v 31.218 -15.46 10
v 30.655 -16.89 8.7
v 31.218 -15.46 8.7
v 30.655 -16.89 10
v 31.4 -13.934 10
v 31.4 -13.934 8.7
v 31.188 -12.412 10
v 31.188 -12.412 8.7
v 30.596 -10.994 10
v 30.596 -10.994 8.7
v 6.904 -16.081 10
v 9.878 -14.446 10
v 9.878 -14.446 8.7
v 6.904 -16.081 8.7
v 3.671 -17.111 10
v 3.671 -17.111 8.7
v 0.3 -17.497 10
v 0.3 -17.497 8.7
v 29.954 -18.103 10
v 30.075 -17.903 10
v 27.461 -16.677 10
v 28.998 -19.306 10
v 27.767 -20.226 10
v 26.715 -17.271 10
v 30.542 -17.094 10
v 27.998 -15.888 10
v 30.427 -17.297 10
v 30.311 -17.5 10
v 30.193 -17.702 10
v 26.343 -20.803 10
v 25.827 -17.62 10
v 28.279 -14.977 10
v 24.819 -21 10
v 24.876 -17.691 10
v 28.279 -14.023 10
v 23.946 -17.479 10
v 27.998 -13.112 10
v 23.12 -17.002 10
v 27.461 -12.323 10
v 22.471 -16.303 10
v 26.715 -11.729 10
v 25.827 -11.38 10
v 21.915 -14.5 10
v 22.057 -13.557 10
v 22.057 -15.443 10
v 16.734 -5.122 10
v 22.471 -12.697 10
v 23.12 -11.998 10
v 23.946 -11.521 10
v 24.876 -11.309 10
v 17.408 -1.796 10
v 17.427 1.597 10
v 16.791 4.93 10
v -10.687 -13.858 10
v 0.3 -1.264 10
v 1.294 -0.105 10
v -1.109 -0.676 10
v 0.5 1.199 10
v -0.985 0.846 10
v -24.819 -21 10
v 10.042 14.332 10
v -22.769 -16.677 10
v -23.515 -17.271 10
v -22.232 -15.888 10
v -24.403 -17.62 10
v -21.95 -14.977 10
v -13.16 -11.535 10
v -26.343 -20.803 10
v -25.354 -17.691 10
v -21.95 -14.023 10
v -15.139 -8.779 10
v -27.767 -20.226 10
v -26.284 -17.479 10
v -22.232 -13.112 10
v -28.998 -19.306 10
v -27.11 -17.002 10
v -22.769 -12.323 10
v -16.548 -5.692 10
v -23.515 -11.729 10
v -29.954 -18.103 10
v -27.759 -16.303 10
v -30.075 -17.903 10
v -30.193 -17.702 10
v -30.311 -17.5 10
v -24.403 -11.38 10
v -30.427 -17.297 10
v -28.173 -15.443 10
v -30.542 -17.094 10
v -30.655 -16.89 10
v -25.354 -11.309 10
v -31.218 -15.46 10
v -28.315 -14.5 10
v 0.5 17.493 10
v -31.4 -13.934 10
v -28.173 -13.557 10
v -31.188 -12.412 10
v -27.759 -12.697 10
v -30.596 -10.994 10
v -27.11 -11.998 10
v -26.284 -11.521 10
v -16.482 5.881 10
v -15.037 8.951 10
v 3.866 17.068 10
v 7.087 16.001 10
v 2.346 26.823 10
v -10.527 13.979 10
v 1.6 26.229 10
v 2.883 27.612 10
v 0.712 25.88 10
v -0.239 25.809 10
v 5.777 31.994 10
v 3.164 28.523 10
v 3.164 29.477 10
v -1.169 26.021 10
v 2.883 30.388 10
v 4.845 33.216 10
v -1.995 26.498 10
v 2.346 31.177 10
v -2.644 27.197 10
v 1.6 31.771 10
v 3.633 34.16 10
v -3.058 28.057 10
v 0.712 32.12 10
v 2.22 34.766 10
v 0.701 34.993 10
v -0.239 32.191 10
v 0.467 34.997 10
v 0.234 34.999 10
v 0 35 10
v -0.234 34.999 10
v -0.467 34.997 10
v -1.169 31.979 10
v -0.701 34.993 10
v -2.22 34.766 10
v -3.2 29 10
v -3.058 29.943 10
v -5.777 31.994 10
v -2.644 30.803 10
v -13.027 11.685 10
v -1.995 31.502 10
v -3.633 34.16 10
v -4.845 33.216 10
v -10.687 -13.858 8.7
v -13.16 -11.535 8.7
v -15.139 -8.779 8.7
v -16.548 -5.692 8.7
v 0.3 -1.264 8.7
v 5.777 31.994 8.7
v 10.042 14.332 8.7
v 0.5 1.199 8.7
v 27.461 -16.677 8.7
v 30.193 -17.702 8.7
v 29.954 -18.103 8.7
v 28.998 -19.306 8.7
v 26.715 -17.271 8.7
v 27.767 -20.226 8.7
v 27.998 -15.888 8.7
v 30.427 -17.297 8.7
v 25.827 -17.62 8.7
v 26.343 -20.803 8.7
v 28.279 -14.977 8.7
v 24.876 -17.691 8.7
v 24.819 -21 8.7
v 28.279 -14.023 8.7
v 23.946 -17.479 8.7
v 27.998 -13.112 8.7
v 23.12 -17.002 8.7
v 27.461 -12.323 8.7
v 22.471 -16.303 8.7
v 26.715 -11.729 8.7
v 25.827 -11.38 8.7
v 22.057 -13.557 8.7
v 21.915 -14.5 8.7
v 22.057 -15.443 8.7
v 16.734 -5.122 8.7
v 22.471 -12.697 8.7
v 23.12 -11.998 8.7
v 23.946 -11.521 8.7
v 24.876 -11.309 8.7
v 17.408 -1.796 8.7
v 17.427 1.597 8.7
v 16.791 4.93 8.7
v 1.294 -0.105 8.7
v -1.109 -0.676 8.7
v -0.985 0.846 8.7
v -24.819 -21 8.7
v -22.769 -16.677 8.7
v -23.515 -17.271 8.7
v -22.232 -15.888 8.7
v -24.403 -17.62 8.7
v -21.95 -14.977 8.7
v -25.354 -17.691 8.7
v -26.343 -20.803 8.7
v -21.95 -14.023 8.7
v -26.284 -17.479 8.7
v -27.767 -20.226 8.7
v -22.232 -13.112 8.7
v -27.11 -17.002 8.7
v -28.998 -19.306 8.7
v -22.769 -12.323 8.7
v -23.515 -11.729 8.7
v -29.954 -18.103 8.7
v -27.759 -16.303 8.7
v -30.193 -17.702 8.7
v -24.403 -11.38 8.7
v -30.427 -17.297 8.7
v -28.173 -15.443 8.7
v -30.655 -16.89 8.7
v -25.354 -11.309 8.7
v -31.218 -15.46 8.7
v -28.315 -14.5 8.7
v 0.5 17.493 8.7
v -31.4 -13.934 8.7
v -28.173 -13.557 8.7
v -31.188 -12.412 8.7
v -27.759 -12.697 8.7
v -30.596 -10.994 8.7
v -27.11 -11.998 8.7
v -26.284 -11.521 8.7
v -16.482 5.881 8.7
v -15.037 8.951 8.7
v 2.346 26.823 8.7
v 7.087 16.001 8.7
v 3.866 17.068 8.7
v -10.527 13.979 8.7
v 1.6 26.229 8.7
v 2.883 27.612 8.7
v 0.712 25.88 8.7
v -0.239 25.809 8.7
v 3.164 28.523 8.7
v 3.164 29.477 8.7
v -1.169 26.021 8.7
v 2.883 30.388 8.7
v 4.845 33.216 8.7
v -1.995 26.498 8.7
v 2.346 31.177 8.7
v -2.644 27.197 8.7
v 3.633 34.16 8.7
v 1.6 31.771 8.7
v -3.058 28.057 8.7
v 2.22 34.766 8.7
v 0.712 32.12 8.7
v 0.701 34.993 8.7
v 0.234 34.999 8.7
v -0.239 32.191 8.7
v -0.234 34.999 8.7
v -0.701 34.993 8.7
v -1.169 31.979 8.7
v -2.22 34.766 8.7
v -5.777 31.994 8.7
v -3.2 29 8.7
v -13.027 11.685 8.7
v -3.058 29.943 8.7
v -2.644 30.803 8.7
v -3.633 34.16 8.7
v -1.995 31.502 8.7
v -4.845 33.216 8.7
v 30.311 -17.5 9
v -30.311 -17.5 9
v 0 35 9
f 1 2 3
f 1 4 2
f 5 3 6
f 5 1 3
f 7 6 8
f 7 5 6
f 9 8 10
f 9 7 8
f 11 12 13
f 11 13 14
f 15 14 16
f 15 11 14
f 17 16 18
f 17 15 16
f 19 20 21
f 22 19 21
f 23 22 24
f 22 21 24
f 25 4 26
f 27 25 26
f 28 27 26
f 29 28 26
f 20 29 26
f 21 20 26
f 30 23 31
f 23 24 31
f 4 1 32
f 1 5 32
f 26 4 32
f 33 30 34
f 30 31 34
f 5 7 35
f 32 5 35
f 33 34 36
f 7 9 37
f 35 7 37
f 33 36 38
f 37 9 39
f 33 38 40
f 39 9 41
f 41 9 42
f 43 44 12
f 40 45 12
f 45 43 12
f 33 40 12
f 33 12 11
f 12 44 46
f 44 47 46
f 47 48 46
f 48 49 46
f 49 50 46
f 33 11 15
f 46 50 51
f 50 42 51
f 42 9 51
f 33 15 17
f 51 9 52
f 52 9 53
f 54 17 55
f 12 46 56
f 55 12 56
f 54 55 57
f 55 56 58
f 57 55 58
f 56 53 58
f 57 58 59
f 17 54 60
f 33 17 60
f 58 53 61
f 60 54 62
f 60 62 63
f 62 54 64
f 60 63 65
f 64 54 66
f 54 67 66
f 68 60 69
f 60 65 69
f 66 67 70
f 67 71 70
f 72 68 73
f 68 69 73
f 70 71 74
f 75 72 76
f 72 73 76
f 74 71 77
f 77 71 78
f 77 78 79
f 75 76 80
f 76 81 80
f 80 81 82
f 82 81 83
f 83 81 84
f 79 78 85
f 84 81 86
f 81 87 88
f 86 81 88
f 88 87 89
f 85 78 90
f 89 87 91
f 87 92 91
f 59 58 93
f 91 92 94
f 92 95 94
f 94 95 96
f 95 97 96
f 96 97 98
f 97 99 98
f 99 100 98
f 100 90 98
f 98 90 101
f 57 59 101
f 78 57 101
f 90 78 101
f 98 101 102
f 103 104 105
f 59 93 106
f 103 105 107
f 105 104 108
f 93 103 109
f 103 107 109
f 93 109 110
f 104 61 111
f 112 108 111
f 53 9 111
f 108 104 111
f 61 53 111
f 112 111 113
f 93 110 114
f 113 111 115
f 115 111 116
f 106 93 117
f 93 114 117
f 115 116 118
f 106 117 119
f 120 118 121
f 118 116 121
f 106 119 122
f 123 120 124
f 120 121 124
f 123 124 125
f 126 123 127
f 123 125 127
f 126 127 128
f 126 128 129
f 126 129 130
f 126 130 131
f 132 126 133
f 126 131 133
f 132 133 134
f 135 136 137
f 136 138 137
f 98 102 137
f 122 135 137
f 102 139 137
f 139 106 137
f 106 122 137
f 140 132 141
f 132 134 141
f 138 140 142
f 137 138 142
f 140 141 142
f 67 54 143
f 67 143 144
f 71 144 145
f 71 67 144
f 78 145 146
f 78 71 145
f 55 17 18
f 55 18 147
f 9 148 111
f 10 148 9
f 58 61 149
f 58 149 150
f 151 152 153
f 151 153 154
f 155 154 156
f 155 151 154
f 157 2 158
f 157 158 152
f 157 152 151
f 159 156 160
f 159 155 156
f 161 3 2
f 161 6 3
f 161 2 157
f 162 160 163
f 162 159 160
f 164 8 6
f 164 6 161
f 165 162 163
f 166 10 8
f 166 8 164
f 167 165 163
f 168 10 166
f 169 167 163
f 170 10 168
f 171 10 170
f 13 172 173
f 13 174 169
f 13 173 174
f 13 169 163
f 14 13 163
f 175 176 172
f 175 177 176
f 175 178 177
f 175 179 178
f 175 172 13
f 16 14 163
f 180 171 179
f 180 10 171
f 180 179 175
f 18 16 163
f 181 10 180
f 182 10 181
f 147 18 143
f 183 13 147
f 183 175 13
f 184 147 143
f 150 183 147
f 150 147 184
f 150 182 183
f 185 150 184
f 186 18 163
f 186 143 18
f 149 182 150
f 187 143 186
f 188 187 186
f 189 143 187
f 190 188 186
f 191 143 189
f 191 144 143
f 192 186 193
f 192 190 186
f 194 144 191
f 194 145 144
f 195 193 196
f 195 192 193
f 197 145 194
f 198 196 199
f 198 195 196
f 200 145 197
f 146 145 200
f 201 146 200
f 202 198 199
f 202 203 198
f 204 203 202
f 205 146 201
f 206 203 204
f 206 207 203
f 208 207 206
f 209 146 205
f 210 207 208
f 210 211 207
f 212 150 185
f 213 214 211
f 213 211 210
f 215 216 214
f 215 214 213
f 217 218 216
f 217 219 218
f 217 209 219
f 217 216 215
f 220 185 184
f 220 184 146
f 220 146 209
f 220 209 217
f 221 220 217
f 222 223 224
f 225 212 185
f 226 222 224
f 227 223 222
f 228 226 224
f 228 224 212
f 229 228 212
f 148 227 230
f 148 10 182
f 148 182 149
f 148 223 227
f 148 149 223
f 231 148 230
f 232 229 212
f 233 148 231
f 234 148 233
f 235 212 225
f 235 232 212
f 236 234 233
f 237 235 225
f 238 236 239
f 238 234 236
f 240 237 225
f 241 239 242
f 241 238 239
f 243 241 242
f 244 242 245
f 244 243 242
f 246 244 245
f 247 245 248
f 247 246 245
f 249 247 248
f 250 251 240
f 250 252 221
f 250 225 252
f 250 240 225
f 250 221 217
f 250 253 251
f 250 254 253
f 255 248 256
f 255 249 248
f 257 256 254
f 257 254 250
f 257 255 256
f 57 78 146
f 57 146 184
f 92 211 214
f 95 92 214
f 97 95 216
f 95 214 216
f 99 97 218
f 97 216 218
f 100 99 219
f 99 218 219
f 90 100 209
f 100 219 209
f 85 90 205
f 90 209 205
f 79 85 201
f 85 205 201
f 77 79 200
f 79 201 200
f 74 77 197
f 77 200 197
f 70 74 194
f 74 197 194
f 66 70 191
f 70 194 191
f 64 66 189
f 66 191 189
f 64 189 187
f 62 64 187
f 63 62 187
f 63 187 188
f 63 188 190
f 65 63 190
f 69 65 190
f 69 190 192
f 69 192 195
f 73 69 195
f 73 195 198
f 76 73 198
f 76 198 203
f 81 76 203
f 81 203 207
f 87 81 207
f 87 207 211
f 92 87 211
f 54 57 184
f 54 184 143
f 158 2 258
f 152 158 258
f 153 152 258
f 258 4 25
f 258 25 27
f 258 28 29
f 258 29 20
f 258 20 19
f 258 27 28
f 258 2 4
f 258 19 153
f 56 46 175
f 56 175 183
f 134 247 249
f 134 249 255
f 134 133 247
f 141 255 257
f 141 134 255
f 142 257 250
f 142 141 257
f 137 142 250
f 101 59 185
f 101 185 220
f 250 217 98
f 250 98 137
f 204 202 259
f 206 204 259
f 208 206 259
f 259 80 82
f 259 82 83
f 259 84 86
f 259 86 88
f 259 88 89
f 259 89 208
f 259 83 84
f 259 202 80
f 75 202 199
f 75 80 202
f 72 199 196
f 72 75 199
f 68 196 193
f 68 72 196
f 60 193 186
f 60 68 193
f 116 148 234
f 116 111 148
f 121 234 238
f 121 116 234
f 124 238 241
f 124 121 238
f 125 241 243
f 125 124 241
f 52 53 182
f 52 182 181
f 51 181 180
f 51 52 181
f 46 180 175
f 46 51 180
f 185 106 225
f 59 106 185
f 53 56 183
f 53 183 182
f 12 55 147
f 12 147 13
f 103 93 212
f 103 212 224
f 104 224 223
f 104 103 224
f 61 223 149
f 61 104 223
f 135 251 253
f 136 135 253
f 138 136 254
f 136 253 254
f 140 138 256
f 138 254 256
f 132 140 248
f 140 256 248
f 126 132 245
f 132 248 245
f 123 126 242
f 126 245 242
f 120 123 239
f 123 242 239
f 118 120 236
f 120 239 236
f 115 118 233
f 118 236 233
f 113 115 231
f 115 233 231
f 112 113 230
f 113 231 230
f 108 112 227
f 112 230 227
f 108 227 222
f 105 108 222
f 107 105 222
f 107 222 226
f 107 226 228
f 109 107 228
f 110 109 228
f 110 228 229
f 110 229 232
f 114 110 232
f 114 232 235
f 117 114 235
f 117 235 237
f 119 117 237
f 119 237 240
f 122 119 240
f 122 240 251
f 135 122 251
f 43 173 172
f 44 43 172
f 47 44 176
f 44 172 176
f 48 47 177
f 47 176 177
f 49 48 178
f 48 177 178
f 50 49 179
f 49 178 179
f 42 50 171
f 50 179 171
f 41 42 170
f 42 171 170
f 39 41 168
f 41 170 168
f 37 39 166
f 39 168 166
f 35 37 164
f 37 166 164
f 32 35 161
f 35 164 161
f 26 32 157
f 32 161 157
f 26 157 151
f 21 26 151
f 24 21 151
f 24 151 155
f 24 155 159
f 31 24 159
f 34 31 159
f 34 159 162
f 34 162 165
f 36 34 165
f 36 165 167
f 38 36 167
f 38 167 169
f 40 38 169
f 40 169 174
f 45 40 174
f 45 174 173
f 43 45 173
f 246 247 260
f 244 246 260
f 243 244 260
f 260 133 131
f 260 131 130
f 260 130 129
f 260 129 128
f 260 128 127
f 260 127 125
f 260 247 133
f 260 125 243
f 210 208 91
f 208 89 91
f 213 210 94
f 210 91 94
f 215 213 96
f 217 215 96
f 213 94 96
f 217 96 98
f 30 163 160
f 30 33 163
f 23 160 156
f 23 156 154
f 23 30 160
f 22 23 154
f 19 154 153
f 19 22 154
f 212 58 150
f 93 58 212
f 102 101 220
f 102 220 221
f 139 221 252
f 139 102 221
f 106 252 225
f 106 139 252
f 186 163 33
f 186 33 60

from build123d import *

# Parameters (mm, degrees)
SKETCH2_R           = 19
BOSS_EXTRUDE1_DEPTH = 1.3
BOSS_EXTRUDE7_START = -1.3
BOSS_EXTRUDE7_DEPTH = 1.3
SKETCH17_R          = 0.7
BOSS_EXTRUDE9_DEPTH = 1.3
BOSS_EXTRUDE2_START = -1.3
SKETCH3_R           = 35
SKETCH3_R_2         = 19
BOSS_EXTRUDE2_DEPTH = 1.3
SKETCH6_R           = 5
BOSS_EXTRUDE4_DEPTH = 1
SKETCH7_R           = 59.131365533
CUT_EXTRUDE1_DEPTH  = 10
FILLET1_R           = 6
SKETCH4_R           = 3.2
CUT_EXTRUDE2_DEPTH  = 10


with BuildPart() as part:
    # Sketch2 → Boss-Extrude1 (new body)
    with BuildSketch(Plane.XY.offset(10)):
        Circle(SKETCH2_R)
        with BuildLine():
            ThreePointArc((0, 0.943688479), (0.291615777, 0.897501077), (0.554686171, 0.763460017))
            Line((0.554686171, 0.763460017), (10.580134541, 14.562305899))
            ThreePointArc((10.580134541, 14.562305899), (14.562305899, 10.580134541), (17.119017293, 5.562305899))
            Line((17.119017293, 5.562305899), (0.897501077, 0.291615777))
            ThreePointArc((0.897501077, 0.291615777), (0.943688479, 0), (0.897501077, -0.291615777))
            Line((0.897501077, -0.291615777), (17.119017293, -5.562305899))
            ThreePointArc((17.119017293, -5.562305899), (14.562305899, -10.580134541), (10.580134541, -14.562305899))
            Line((10.580134541, -14.562305899), (0.554686171, -0.763460017))
            ThreePointArc((0.554686171, -0.763460017), (0.291615777, -0.897501077), (0, -0.943688479))
            Line((0, -0.943688479), (0, -18))
            ThreePointArc((0, -18), (-5.562305899, -17.119017293), (-10.580134541, -14.562305899))
            Line((-10.580134541, -14.562305899), (-0.554686171, -0.763460017))
            ThreePointArc((-0.554686171, -0.763460017), (-0.763460017, -0.554686171), (-0.897501077, -0.291615777))
            Line((-0.897501077, -0.291615777), (-17.119017293, -5.562305899))
            ThreePointArc((-17.119017293, -5.562305899), (-18, 0), (-17.119017293, 5.562305899))
            Line((-17.119017293, 5.562305899), (-0.897501077, 0.291615777))
            ThreePointArc((-0.897501077, 0.291615777), (-0.763460017, 0.554686171), (-0.554686171, 0.763460017))
            Line((-0.554686171, 0.763460017), (-10.580134541, 14.562305899))
            ThreePointArc((-10.580134541, 14.562305899), (-5.562305899, 17.119017293), (0, 18))
            Line((0, 18), (0, 0.943688479))
        make_face(mode=Mode.SUBTRACT)
        with BuildLine():
            Line((0.5, 1.198581445), (0.5, 17.492855685))
            ThreePointArc((0.5, 17.492855685), (5.50283957, 16.612307385), (10.042025258, 14.332052495))
            Line((10.042025258, 14.332052495), (0.5, 1.198581445))
        make_face(mode=Mode.SUBTRACT)
        with BuildLine():
            Line((-0.985410197, 0.845910294), (-16.48218589, 5.881117945))
            ThreePointArc((-16.48218589, 5.881117945), (-14.098772245, 10.366996729), (-10.527435455, 13.979381344))
            Line((-10.527435455, 13.979381344), (-0.985410197, 0.845910294))
        make_face(mode=Mode.SUBTRACT)
        with BuildLine():
            Line((-1.109016994, -0.675780132), (-10.686551089, -13.858124903))
            ThreePointArc((-10.686551089, -13.858124903), (-14.216360017, -10.205151045), (-16.548338183, -5.692319683))
            Line((-16.548338183, -5.692319683), (-1.109016994, -0.675780132))
        make_face(mode=Mode.SUBTRACT)
        with BuildLine():
            ThreePointArc((9.877534095, -14.445910155), (5.312578558, -16.674126936), (0.3, -17.497428382))
            Line((0.3, -17.497428382), (0.3, -1.263565384))
            Line((0.3, -1.263565384), (9.877534095, -14.445910155))
        make_face(mode=Mode.SUBTRACT)
        with BuildLine():
            Line((16.73374838, -5.121685773), (1.294427191, -0.105146222))
            Line((1.294427191, -0.105146222), (16.791202885, 4.930061429))
            ThreePointArc((16.791202885, 4.930061429), (17.499714134, -0.100026134), (16.73374838, -5.121685773))
        make_face(mode=Mode.SUBTRACT)
    extrude(amount=-BOSS_EXTRUDE1_DEPTH)

    # Sketch11 → Boss-Extrude7 (add)
    with BuildSketch(Plane(origin=(0, 0, 8.7), x_dir=(-1, 0, 0), z_dir=(0, 0, -1)).offset(BOSS_EXTRUDE7_START)):
        with BuildLine():
            ThreePointArc((-0.897501077, 0.291615777), (-0.763460017, 0.554686171), (-0.554686171, 0.763460017))
            Line((-0.554686171, 0.763460017), (-10.580134541, 14.562305899))
            ThreePointArc((-10.580134541, 14.562305899), (-14.562305899, 10.580134541), (-17.119017293, 5.562305899))
            Line((-17.119017293, 5.562305899), (-0.897501077, 0.291615777))
        make_face()
        with BuildLine():
            Line((0, 18), (0, 0.943688479))
            ThreePointArc((0, 0.943688479), (0.291615777, 0.897501077), (0.554686171, 0.763460017))
            Line((0.554686171, 0.763460017), (10.580134541, 14.562305899))
            ThreePointArc((10.580134541, 14.562305899), (5.562305899, 17.119017293), (0, 18))
        make_face()
        with BuildLine():
            Line((17.119017293, 5.562305899), (0.897501077, 0.291615777))
            ThreePointArc((0.897501077, 0.291615777), (0.932070108, 0.147625402), (0.943688479, 0))
            ThreePointArc((0.943688479, 0), (0.932070108, -0.147625402), (0.897501077, -0.291615777))
            Line((0.897501077, -0.291615777), (17.119017293, -5.562305899))
            ThreePointArc((17.119017293, -5.562305899), (18, 0), (17.119017293, 5.562305899))
        make_face()
        with BuildLine():
            Line((10.580134541, -14.562305899), (0.554686171, -0.763460017))
            ThreePointArc((0.554686171, -0.763460017), (0.291615777, -0.897501077), (0, -0.943688479))
            Line((0, -0.943688479), (0, -18))
            ThreePointArc((0, -18), (5.562305899, -17.119017293), (10.580134541, -14.562305899))
        make_face()
        with BuildLine():
            ThreePointArc((-0.554686171, -0.763460017), (-0.763460017, -0.554686171), (-0.897501077, -0.291615777))
            Line((-0.897501077, -0.291615777), (-17.119017293, -5.562305899))
            ThreePointArc((-17.119017293, -5.562305899), (-14.562305899, -10.580134541), (-10.580134541, -14.562305899))
            Line((-10.580134541, -14.562305899), (-0.554686171, -0.763460017))
        make_face()
        with BuildLine():
            ThreePointArc((0.554686171, 0.763460017), (0.291615777, 0.897501077), (0, 0.943688479))
            ThreePointArc((0, 0.943688479), (-0.291615777, 0.897501077), (-0.554686171, 0.763460017))
            ThreePointArc((-0.554686171, 0.763460017), (-0.763460017, 0.554686171), (-0.897501077, 0.291615777))
            ThreePointArc((-0.897501077, 0.291615777), (-0.943688479, 0), (-0.897501077, -0.291615777))
            ThreePointArc((-0.897501077, -0.291615777), (-0.763460017, -0.554686171), (-0.554686171, -0.763460017))
            ThreePointArc((-0.554686171, -0.763460017), (-0.291615777, -0.897501077), (0, -0.943688479))
            ThreePointArc((0, -0.943688479), (0.291615777, -0.897501077), (0.554686171, -0.763460017))
            ThreePointArc((0.554686171, -0.763460017), (0.763460017, -0.554686171), (0.897501077, -0.291615777))
            ThreePointArc((0.897501077, -0.291615777), (0.932070108, -0.147625402), (0.943688479, 0))
            ThreePointArc((0.943688479, 0), (0.932070108, 0.147625402), (0.897501077, 0.291615777))
            ThreePointArc((0.897501077, 0.291615777), (0.763460017, 0.554686171), (0.554686171, 0.763460017))
        make_face()
    extrude(amount=BOSS_EXTRUDE7_DEPTH)

    # Sketch17 → Boss-Extrude9 (add)
    with BuildSketch(Plane(origin=(0, 0, 8.7), x_dir=(-1, 0, 0), z_dir=(0, 0, -1))):
        Circle(SKETCH17_R)
    extrude(amount=-BOSS_EXTRUDE9_DEPTH)

    # Sketch3 → Boss-Extrude2 (add)
    with BuildSketch(Plane(origin=(0, 0, 8.7), x_dir=(-1, 0, 0), z_dir=(0, 0, -1)).offset(BOSS_EXTRUDE2_START)):
        Circle(SKETCH3_R)
        Circle(SKETCH3_R_2, mode=Mode.SUBTRACT)
    extrude(amount=BOSS_EXTRUDE2_DEPTH)

    # Sketch6 → Boss-Extrude4 (add)
    with BuildSketch(Plane(origin=(0, 0, 10), x_dir=(-1, 0, 0), z_dir=(0, 0, -1))):
        with Locations((0, 30)):
            Circle(SKETCH6_R)
        with Locations((25.980762114, -15)):
            Circle(SKETCH6_R)
        with Locations((-25.980762114, -15)):
            Circle(SKETCH6_R)
    extrude(amount=BOSS_EXTRUDE4_DEPTH)

    # Sketch7 → Cut-Extrude1 (cut)
    with BuildSketch(Plane(origin=(0, 0, 8.7), x_dir=(-1, 0, 0), z_dir=(0, 0, -1))):
        Circle(SKETCH7_R)
        Polygon((0, 42), (-36.373066959, -21), (36.373066959, -21), align=None, mode=Mode.SUBTRACT)
    extrude(amount=-CUT_EXTRUDE1_DEPTH, mode=Mode.SUBTRACT)

    # Fillet1
    fillet1_edges = [part.edges().sort_by_distance(p)[0] for p in [
        (4.186533479, 34.748711306, 9.35),
        (32.186533479, -13.748711306, 9.35),
        (28, -21, 9.35),
        (-28, -21, 9.35),
        (-32.186533479, -13.748711306, 9.35),
        (-4.186533479, 34.748711306, 9.35),
    ]]
    fillet(fillet1_edges, radius=FILLET1_R)

    # Sketch4 → Cut-Extrude2 (cut)
    with BuildSketch(Plane(origin=(0, 0, 8.7), x_dir=(-1, 0, 0), z_dir=(0, 0, -1))):
        with Locations((0, 29)):
            Circle(SKETCH4_R)
        with Locations((25.11473671, -14.5)):
            Circle(SKETCH4_R)
        with Locations((-25.11473671, -14.5)):
            Circle(SKETCH4_R)
    extrude(amount=-CUT_EXTRUDE2_DEPTH, mode=Mode.SUBTRACT)


solid = part.part
